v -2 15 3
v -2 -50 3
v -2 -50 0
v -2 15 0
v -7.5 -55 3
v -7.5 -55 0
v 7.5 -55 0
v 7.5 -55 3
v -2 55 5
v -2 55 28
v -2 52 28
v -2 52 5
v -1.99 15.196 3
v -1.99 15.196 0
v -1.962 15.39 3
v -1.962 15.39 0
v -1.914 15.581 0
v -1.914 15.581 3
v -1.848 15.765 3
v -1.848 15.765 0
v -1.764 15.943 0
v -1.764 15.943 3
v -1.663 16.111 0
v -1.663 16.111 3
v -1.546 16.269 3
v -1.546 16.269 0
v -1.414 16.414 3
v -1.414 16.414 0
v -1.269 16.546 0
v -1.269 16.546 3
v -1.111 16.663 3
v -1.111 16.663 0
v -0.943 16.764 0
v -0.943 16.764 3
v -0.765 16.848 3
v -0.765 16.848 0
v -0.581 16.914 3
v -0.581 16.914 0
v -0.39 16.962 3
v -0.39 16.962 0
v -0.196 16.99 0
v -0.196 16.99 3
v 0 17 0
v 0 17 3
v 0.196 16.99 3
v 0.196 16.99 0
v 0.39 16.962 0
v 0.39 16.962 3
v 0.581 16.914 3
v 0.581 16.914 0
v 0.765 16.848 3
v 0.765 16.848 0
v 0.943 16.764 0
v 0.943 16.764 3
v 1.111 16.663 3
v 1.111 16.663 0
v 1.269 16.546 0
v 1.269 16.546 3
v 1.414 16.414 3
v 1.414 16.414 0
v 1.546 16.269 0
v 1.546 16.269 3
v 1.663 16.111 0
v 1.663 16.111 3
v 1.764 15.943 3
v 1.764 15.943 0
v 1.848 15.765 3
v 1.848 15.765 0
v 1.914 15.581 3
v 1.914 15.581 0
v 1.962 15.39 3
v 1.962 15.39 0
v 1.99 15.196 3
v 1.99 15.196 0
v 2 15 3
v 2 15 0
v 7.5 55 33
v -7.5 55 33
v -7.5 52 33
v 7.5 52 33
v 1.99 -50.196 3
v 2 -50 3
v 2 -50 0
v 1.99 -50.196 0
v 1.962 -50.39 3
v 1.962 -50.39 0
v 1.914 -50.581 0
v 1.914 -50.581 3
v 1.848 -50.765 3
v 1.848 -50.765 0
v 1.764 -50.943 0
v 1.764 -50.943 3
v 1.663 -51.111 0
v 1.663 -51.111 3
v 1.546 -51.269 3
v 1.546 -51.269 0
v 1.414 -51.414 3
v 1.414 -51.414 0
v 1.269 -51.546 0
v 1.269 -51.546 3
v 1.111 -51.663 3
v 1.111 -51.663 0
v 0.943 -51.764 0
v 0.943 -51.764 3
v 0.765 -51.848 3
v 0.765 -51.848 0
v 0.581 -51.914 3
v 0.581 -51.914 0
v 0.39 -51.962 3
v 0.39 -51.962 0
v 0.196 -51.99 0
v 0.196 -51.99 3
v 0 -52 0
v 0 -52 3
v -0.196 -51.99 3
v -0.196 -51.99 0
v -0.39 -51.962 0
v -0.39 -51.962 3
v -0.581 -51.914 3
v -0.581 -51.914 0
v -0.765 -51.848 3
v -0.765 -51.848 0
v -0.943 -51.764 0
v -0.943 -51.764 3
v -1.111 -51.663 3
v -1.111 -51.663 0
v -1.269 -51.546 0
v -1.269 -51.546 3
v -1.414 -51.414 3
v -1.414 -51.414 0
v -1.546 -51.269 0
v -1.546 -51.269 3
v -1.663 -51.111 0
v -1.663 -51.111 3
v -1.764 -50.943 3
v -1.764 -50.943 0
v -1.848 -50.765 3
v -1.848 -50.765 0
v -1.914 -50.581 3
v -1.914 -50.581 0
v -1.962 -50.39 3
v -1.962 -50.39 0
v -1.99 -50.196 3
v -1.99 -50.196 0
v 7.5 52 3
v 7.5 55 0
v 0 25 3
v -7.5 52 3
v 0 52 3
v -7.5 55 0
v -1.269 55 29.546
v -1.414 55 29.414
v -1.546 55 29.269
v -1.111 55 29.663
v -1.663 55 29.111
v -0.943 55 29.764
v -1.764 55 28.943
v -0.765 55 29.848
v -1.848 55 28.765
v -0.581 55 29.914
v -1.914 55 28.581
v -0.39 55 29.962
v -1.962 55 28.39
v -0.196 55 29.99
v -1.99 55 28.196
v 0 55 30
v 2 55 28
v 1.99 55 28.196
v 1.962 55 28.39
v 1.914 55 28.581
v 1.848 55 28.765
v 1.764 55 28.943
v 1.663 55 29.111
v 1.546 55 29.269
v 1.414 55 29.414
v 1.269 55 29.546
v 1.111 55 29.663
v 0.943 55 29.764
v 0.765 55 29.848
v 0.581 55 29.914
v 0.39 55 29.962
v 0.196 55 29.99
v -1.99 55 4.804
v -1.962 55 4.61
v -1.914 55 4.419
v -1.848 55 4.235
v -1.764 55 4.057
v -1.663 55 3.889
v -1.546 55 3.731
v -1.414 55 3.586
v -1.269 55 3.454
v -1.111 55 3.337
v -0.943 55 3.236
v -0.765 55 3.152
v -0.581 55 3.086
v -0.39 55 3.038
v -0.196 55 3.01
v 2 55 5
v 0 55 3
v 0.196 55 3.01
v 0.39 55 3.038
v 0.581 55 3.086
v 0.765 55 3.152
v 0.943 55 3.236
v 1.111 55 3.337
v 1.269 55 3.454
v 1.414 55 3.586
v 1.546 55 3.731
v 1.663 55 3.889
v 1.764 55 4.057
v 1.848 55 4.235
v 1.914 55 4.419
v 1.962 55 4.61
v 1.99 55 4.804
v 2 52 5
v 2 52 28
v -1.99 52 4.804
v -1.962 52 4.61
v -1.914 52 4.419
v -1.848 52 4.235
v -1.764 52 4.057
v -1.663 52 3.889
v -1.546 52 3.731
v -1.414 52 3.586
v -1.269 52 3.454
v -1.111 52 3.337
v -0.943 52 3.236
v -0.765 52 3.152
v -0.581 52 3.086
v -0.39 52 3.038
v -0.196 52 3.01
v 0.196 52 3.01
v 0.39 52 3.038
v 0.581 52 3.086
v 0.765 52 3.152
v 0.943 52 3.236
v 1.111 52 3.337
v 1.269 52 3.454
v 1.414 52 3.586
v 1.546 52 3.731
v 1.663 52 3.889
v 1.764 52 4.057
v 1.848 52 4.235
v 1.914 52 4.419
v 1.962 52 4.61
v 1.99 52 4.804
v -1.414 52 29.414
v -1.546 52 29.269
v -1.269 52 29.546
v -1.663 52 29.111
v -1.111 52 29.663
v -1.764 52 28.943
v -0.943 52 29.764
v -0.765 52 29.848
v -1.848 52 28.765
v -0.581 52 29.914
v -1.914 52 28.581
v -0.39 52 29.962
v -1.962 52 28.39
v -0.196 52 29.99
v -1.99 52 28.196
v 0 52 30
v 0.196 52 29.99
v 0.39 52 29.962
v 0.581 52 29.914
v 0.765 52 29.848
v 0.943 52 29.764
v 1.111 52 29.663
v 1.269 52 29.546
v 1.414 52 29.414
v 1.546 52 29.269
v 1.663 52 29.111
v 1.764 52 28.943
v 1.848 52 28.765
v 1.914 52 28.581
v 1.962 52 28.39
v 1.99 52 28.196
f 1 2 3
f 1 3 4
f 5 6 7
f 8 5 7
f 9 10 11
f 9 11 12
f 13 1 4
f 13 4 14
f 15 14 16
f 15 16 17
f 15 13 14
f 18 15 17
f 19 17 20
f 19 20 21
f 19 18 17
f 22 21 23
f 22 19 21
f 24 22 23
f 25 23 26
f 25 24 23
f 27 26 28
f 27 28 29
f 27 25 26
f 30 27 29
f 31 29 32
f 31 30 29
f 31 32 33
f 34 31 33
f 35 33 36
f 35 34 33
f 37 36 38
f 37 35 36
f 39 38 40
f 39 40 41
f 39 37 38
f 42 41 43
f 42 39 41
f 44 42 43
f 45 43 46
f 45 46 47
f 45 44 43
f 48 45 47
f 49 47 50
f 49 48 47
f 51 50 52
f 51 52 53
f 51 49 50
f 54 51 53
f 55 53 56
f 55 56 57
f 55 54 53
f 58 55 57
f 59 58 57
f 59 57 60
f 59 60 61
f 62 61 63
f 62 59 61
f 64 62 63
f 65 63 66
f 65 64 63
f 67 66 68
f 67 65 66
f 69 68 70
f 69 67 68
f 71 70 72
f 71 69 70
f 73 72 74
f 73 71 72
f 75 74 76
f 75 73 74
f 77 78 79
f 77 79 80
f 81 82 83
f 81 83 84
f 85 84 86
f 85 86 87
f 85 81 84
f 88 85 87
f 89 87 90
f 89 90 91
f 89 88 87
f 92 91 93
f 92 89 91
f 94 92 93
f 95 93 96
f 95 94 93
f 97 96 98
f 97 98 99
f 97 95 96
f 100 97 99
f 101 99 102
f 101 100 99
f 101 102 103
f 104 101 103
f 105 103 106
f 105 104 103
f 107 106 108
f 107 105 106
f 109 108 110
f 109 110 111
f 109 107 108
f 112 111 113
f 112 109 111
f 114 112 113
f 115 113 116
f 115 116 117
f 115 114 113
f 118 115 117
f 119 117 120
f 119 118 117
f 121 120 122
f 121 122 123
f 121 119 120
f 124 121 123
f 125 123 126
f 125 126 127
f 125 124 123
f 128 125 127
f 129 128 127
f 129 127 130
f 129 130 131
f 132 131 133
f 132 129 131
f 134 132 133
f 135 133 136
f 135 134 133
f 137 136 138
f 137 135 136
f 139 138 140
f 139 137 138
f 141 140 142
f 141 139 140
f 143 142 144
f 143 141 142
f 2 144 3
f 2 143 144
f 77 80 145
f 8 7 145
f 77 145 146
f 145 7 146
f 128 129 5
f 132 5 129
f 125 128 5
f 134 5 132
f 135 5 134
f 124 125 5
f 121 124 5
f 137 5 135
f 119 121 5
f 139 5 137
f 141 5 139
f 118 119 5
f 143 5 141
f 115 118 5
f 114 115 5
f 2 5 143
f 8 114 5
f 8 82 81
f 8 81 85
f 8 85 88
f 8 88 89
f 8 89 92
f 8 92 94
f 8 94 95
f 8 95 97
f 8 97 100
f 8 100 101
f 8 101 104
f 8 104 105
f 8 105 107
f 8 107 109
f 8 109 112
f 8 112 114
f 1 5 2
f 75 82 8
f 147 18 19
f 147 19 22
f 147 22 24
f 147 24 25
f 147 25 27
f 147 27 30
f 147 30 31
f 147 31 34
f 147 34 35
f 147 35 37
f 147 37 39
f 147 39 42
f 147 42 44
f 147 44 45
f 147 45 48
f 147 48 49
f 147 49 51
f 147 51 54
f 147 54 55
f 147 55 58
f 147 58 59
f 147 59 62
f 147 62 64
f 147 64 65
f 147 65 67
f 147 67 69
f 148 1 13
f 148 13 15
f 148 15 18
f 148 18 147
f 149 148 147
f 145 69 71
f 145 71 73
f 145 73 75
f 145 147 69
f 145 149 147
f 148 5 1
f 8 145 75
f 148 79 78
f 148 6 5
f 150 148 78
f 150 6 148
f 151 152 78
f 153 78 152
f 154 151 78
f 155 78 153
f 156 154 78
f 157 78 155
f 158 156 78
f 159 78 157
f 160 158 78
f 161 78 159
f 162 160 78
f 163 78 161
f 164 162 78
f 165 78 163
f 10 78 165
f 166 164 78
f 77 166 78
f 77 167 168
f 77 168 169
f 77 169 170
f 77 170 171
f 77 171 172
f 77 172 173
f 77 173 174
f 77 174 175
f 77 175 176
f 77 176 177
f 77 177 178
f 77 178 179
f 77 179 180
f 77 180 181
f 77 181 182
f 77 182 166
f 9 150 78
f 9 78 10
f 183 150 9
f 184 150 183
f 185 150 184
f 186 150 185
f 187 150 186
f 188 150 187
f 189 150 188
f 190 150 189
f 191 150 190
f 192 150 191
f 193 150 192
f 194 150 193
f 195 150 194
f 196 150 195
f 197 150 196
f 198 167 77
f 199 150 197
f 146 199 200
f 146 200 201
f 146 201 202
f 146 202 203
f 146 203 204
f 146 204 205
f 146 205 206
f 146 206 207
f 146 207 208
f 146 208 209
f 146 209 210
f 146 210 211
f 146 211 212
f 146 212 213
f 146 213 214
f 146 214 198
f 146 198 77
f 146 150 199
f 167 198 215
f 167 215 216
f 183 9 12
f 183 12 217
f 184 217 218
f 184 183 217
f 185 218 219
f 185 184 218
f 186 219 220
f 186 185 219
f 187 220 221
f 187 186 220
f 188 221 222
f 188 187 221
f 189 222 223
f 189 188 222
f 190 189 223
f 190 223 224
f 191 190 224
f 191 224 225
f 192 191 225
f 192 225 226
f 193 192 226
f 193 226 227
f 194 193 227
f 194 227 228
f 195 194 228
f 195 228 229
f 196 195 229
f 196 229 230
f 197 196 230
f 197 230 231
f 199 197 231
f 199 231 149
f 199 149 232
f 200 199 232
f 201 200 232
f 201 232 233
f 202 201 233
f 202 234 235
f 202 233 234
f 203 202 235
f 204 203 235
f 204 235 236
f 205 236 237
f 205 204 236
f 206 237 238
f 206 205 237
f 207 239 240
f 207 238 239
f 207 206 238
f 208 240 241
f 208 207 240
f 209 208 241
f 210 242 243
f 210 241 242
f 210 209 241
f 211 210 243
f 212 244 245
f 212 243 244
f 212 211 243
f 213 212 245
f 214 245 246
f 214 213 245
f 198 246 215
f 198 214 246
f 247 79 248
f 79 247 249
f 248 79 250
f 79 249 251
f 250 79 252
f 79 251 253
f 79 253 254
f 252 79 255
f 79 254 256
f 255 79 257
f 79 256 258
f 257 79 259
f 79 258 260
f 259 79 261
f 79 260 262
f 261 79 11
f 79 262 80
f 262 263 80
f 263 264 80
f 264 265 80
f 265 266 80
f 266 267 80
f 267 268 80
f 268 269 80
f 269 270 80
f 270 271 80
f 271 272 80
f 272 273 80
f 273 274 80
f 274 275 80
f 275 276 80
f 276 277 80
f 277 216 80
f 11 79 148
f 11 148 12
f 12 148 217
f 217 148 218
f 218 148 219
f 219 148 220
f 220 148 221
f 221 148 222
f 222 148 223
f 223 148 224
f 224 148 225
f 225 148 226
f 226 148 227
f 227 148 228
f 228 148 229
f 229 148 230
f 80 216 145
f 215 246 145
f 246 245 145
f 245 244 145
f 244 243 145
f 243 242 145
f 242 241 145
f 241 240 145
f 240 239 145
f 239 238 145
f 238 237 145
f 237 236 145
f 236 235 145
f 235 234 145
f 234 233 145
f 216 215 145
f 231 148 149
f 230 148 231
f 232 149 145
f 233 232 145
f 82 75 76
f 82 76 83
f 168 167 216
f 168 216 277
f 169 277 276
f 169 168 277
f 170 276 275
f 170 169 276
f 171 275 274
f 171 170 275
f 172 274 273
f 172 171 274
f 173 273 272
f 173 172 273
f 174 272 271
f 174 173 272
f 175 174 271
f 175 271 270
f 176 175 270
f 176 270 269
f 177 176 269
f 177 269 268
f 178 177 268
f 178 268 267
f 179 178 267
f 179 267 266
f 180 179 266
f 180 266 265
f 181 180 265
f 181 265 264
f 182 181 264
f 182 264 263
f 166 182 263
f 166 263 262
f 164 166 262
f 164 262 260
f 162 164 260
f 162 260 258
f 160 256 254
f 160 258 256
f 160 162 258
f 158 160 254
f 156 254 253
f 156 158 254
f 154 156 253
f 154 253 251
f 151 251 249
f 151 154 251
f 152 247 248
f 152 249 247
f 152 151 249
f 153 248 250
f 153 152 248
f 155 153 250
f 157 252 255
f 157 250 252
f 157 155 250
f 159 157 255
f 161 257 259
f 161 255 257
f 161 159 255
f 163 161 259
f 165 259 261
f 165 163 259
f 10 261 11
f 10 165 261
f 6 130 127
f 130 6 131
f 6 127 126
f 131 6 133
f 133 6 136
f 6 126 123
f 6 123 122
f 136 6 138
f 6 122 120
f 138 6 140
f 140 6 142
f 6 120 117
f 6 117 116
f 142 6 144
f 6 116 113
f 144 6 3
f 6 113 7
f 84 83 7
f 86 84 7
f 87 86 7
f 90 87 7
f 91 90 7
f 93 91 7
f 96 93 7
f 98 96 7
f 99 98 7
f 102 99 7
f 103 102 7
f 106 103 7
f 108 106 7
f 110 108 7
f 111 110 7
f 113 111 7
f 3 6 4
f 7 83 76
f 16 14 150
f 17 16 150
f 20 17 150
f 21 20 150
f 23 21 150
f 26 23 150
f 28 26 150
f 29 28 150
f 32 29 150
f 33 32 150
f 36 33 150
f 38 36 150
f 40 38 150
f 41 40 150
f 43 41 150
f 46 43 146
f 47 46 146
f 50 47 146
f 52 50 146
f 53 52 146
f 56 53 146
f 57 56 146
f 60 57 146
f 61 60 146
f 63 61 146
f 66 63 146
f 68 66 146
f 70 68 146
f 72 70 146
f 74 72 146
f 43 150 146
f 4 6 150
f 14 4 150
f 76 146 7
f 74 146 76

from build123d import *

# Parameters (mm, degrees)
SKETCH1_W           = 15
SKETCH1_H           = 110
BOSS_EXTRUDE1_DEPTH = 3
CUT_EXTRUDE1_DEPTH  = 3
SKETCH3_W           = 15
SKETCH3_H           = 3
BOSS_EXTRUDE2_DEPTH = 30
CUT_EXTRUDE2_DEPTH  = 30


with BuildPart() as part:
    # Sketch1 → Boss-Extrude1 (new body)
    with BuildSketch(Plane.XY):
        Rectangle(SKETCH1_W, SKETCH1_H)
    extrude(amount=BOSS_EXTRUDE1_DEPTH)

    # Sketch2 → Cut-Extrude1 (cut)
    with BuildSketch(Plane.XY.offset(3)):
        with BuildLine():
            Line((2, 15), (2, -50))
            ThreePointArc((2, -50), (0, -52), (-2, -50))
            Line((-2, -50), (-2, 15))
            ThreePointArc((-2, 15), (0, 17), (2, 15))
        make_face()
    extrude(amount=-CUT_EXTRUDE1_DEPTH, mode=Mode.SUBTRACT)

    # Sketch3 → Boss-Extrude2 (add)
    with BuildSketch(Plane.XY.offset(3)):
        with Locations((0, 53.5)):
            Rectangle(SKETCH3_W, SKETCH3_H)
    extrude(amount=BOSS_EXTRUDE2_DEPTH)

    # Sketch4 → Cut-Extrude2 (cut)
    with BuildSketch(Plane(origin=(0, 55, 0), x_dir=(1, 0, 0), z_dir=(0, 1, 0))):
        with BuildLine():
            Line((2, -5), (2, -28))
            ThreePointArc((2, -28), (0, -30), (-2, -28))
            Line((-2, -28), (-2, -5))
            ThreePointArc((-2, -5), (0, -3), (2, -5))
        make_face()
    extrude(amount=-CUT_EXTRUDE2_DEPTH, mode=Mode.SUBTRACT)


solid = part.part
